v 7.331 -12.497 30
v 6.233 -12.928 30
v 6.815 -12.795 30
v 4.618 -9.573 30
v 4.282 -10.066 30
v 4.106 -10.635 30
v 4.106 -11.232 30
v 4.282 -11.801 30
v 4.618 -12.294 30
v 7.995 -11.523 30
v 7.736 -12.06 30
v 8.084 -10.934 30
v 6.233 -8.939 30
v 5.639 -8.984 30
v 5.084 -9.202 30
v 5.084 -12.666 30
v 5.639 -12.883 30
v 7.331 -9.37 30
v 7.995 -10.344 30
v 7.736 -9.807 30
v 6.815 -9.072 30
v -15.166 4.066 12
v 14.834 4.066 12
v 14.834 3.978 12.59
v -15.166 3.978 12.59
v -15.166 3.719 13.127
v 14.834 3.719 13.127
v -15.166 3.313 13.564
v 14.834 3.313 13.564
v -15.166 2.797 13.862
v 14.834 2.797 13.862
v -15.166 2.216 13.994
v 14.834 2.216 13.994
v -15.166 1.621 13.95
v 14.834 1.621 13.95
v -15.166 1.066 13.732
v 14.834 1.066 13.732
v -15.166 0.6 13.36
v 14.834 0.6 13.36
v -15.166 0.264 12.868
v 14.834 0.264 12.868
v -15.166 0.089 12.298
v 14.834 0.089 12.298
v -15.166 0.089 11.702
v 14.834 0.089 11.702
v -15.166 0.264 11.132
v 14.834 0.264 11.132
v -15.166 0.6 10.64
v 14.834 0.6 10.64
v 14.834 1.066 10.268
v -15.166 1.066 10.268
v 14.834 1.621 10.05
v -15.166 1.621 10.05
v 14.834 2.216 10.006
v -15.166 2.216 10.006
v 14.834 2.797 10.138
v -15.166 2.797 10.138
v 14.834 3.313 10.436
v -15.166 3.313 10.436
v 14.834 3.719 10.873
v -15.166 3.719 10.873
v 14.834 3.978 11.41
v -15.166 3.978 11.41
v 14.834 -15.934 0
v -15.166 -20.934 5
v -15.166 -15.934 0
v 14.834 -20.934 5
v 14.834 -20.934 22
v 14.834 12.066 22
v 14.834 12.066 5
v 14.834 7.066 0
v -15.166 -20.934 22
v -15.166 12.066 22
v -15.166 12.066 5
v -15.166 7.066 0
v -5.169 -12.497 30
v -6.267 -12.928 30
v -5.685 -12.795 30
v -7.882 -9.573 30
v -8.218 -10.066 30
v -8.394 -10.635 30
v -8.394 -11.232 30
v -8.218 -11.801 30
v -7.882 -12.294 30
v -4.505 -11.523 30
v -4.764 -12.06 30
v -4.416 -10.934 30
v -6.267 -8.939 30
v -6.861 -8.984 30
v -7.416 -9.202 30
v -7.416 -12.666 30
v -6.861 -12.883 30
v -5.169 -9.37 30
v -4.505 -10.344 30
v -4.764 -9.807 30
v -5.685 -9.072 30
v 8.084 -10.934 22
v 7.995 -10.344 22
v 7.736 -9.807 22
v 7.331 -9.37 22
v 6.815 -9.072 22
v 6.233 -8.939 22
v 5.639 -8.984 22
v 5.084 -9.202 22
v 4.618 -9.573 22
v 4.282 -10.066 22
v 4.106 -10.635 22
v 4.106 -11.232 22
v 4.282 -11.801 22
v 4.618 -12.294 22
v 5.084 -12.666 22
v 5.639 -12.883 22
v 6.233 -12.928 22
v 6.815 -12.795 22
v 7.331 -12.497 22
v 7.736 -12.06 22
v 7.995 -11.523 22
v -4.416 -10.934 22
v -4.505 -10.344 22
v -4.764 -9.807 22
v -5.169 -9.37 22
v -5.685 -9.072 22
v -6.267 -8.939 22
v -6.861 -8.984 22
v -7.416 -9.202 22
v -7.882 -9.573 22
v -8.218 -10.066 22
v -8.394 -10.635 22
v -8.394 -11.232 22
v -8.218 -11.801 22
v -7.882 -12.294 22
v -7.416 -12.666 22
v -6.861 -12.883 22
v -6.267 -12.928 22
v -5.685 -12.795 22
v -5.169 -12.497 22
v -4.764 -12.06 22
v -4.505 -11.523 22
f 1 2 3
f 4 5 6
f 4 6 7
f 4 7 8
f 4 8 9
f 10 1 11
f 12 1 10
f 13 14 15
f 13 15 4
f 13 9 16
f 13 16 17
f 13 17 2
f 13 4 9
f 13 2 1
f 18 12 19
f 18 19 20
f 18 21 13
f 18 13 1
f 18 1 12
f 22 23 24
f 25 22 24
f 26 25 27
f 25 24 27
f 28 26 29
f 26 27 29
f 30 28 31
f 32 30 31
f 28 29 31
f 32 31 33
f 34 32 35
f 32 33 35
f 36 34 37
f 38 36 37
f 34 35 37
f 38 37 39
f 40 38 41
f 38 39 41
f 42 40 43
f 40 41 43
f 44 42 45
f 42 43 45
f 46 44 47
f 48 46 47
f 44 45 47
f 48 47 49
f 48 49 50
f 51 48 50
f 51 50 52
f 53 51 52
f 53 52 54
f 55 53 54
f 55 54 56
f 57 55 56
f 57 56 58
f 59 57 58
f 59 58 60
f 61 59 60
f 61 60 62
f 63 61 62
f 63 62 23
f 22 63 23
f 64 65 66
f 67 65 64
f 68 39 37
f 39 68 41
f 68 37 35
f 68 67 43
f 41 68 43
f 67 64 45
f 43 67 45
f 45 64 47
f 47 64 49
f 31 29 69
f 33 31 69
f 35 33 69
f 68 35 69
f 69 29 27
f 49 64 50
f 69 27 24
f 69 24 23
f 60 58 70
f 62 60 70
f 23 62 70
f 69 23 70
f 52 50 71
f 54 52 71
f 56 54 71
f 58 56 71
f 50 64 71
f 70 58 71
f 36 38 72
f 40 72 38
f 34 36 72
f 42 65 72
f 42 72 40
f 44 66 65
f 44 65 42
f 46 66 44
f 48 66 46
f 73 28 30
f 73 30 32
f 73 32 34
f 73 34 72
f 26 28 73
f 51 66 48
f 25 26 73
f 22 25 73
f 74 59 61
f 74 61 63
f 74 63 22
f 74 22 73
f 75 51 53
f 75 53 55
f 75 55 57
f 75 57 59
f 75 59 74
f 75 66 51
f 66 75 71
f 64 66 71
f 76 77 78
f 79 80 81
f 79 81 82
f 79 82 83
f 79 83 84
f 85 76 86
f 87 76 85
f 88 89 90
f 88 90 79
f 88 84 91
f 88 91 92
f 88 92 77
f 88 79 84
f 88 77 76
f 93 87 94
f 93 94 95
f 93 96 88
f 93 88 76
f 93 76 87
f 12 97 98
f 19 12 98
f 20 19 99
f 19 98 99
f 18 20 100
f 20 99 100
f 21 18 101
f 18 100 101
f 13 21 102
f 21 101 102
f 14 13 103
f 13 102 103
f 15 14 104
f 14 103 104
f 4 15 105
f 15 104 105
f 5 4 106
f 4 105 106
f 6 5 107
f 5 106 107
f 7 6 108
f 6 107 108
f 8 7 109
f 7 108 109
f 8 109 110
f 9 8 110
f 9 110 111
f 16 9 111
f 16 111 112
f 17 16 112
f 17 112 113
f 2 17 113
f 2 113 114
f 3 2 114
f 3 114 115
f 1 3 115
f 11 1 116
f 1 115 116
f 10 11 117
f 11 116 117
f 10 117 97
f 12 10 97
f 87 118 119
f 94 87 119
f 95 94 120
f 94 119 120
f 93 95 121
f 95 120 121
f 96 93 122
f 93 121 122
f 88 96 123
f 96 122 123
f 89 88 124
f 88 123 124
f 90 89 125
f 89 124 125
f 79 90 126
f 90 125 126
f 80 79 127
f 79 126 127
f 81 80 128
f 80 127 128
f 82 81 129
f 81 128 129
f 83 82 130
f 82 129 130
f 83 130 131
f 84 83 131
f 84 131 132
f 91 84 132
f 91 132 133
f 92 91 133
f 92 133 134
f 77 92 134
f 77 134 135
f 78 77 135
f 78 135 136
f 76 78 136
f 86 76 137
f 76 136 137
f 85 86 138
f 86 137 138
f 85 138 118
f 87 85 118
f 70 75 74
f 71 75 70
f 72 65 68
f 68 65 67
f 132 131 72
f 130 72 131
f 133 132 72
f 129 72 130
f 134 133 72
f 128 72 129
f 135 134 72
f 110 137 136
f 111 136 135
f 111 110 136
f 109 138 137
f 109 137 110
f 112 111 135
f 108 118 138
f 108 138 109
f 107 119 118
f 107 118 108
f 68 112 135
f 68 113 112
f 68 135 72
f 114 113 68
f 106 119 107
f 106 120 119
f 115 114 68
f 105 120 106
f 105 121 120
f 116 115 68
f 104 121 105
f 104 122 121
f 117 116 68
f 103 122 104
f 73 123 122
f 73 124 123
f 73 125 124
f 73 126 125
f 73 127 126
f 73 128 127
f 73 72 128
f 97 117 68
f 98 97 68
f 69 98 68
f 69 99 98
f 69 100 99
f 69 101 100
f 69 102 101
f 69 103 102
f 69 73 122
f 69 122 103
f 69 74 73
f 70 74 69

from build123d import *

# Parameters (mm, degrees)
CROQUIS1_W              = 30
CROQUIS1_H              = 33
SALIENTE_EXTRUIR1_DEPTH = 22
CROQUIS2_R              = 2
SALIENTE_EXTRUIR2_DEPTH = 8
CHAFL_N1_SIZE           = 5
CHAFL_N2_SIZE           = 5
CROQUIS3_R              = 2
CORTAR_EXTRUIR1_DEPTH   = 35


with BuildPart() as part:
    # Croquis1 → Saliente-Extruir1 (new body)
    with BuildSketch(Plane.XY):
        with Locations((-0.166051661, -4.433579336)):
            Rectangle(CROQUIS1_W, CROQUIS1_H)
    extrude(amount=SALIENTE_EXTRUIR1_DEPTH)

    # Croquis2 → Saliente-Extruir2 (add)
    with BuildSketch(Plane.XY.offset(22)):
        with Locations((-6.416051661, -10.933579336)):
            Circle(CROQUIS2_R)
        with Locations((6.083948339, -10.933579336)):
            Circle(CROQUIS2_R)
    extrude(amount=SALIENTE_EXTRUIR2_DEPTH)

    # Chaflán1
    chafl_n1_edges = [part.edges().sort_by_distance(p)[0] for p in [
        (-0.166051661, 12.066420664, 0),
    ]]
    chamfer(chafl_n1_edges, length=CHAFL_N1_SIZE)

    # Chaflán2
    chafl_n2_edges = [part.edges().sort_by_distance(p)[0] for p in [
        (-0.166051661, -20.933579336, 0),
    ]]
    chamfer(chafl_n2_edges, length=CHAFL_N2_SIZE)

    # Croquis3 → Cortar-Extruir1 (cut)
    with BuildSketch(Plane(origin=(14.833948339, 0, 0), x_dir=(0, 0, -1), z_dir=(1, 0, 0))):
        with Locations(Location((-12, 2.066420664, 0), (0, 0, 90))):
            Circle(CROQUIS3_R)
    extrude(amount=-CORTAR_EXTRUIR1_DEPTH, mode=Mode.SUBTRACT)


solid = part.part
